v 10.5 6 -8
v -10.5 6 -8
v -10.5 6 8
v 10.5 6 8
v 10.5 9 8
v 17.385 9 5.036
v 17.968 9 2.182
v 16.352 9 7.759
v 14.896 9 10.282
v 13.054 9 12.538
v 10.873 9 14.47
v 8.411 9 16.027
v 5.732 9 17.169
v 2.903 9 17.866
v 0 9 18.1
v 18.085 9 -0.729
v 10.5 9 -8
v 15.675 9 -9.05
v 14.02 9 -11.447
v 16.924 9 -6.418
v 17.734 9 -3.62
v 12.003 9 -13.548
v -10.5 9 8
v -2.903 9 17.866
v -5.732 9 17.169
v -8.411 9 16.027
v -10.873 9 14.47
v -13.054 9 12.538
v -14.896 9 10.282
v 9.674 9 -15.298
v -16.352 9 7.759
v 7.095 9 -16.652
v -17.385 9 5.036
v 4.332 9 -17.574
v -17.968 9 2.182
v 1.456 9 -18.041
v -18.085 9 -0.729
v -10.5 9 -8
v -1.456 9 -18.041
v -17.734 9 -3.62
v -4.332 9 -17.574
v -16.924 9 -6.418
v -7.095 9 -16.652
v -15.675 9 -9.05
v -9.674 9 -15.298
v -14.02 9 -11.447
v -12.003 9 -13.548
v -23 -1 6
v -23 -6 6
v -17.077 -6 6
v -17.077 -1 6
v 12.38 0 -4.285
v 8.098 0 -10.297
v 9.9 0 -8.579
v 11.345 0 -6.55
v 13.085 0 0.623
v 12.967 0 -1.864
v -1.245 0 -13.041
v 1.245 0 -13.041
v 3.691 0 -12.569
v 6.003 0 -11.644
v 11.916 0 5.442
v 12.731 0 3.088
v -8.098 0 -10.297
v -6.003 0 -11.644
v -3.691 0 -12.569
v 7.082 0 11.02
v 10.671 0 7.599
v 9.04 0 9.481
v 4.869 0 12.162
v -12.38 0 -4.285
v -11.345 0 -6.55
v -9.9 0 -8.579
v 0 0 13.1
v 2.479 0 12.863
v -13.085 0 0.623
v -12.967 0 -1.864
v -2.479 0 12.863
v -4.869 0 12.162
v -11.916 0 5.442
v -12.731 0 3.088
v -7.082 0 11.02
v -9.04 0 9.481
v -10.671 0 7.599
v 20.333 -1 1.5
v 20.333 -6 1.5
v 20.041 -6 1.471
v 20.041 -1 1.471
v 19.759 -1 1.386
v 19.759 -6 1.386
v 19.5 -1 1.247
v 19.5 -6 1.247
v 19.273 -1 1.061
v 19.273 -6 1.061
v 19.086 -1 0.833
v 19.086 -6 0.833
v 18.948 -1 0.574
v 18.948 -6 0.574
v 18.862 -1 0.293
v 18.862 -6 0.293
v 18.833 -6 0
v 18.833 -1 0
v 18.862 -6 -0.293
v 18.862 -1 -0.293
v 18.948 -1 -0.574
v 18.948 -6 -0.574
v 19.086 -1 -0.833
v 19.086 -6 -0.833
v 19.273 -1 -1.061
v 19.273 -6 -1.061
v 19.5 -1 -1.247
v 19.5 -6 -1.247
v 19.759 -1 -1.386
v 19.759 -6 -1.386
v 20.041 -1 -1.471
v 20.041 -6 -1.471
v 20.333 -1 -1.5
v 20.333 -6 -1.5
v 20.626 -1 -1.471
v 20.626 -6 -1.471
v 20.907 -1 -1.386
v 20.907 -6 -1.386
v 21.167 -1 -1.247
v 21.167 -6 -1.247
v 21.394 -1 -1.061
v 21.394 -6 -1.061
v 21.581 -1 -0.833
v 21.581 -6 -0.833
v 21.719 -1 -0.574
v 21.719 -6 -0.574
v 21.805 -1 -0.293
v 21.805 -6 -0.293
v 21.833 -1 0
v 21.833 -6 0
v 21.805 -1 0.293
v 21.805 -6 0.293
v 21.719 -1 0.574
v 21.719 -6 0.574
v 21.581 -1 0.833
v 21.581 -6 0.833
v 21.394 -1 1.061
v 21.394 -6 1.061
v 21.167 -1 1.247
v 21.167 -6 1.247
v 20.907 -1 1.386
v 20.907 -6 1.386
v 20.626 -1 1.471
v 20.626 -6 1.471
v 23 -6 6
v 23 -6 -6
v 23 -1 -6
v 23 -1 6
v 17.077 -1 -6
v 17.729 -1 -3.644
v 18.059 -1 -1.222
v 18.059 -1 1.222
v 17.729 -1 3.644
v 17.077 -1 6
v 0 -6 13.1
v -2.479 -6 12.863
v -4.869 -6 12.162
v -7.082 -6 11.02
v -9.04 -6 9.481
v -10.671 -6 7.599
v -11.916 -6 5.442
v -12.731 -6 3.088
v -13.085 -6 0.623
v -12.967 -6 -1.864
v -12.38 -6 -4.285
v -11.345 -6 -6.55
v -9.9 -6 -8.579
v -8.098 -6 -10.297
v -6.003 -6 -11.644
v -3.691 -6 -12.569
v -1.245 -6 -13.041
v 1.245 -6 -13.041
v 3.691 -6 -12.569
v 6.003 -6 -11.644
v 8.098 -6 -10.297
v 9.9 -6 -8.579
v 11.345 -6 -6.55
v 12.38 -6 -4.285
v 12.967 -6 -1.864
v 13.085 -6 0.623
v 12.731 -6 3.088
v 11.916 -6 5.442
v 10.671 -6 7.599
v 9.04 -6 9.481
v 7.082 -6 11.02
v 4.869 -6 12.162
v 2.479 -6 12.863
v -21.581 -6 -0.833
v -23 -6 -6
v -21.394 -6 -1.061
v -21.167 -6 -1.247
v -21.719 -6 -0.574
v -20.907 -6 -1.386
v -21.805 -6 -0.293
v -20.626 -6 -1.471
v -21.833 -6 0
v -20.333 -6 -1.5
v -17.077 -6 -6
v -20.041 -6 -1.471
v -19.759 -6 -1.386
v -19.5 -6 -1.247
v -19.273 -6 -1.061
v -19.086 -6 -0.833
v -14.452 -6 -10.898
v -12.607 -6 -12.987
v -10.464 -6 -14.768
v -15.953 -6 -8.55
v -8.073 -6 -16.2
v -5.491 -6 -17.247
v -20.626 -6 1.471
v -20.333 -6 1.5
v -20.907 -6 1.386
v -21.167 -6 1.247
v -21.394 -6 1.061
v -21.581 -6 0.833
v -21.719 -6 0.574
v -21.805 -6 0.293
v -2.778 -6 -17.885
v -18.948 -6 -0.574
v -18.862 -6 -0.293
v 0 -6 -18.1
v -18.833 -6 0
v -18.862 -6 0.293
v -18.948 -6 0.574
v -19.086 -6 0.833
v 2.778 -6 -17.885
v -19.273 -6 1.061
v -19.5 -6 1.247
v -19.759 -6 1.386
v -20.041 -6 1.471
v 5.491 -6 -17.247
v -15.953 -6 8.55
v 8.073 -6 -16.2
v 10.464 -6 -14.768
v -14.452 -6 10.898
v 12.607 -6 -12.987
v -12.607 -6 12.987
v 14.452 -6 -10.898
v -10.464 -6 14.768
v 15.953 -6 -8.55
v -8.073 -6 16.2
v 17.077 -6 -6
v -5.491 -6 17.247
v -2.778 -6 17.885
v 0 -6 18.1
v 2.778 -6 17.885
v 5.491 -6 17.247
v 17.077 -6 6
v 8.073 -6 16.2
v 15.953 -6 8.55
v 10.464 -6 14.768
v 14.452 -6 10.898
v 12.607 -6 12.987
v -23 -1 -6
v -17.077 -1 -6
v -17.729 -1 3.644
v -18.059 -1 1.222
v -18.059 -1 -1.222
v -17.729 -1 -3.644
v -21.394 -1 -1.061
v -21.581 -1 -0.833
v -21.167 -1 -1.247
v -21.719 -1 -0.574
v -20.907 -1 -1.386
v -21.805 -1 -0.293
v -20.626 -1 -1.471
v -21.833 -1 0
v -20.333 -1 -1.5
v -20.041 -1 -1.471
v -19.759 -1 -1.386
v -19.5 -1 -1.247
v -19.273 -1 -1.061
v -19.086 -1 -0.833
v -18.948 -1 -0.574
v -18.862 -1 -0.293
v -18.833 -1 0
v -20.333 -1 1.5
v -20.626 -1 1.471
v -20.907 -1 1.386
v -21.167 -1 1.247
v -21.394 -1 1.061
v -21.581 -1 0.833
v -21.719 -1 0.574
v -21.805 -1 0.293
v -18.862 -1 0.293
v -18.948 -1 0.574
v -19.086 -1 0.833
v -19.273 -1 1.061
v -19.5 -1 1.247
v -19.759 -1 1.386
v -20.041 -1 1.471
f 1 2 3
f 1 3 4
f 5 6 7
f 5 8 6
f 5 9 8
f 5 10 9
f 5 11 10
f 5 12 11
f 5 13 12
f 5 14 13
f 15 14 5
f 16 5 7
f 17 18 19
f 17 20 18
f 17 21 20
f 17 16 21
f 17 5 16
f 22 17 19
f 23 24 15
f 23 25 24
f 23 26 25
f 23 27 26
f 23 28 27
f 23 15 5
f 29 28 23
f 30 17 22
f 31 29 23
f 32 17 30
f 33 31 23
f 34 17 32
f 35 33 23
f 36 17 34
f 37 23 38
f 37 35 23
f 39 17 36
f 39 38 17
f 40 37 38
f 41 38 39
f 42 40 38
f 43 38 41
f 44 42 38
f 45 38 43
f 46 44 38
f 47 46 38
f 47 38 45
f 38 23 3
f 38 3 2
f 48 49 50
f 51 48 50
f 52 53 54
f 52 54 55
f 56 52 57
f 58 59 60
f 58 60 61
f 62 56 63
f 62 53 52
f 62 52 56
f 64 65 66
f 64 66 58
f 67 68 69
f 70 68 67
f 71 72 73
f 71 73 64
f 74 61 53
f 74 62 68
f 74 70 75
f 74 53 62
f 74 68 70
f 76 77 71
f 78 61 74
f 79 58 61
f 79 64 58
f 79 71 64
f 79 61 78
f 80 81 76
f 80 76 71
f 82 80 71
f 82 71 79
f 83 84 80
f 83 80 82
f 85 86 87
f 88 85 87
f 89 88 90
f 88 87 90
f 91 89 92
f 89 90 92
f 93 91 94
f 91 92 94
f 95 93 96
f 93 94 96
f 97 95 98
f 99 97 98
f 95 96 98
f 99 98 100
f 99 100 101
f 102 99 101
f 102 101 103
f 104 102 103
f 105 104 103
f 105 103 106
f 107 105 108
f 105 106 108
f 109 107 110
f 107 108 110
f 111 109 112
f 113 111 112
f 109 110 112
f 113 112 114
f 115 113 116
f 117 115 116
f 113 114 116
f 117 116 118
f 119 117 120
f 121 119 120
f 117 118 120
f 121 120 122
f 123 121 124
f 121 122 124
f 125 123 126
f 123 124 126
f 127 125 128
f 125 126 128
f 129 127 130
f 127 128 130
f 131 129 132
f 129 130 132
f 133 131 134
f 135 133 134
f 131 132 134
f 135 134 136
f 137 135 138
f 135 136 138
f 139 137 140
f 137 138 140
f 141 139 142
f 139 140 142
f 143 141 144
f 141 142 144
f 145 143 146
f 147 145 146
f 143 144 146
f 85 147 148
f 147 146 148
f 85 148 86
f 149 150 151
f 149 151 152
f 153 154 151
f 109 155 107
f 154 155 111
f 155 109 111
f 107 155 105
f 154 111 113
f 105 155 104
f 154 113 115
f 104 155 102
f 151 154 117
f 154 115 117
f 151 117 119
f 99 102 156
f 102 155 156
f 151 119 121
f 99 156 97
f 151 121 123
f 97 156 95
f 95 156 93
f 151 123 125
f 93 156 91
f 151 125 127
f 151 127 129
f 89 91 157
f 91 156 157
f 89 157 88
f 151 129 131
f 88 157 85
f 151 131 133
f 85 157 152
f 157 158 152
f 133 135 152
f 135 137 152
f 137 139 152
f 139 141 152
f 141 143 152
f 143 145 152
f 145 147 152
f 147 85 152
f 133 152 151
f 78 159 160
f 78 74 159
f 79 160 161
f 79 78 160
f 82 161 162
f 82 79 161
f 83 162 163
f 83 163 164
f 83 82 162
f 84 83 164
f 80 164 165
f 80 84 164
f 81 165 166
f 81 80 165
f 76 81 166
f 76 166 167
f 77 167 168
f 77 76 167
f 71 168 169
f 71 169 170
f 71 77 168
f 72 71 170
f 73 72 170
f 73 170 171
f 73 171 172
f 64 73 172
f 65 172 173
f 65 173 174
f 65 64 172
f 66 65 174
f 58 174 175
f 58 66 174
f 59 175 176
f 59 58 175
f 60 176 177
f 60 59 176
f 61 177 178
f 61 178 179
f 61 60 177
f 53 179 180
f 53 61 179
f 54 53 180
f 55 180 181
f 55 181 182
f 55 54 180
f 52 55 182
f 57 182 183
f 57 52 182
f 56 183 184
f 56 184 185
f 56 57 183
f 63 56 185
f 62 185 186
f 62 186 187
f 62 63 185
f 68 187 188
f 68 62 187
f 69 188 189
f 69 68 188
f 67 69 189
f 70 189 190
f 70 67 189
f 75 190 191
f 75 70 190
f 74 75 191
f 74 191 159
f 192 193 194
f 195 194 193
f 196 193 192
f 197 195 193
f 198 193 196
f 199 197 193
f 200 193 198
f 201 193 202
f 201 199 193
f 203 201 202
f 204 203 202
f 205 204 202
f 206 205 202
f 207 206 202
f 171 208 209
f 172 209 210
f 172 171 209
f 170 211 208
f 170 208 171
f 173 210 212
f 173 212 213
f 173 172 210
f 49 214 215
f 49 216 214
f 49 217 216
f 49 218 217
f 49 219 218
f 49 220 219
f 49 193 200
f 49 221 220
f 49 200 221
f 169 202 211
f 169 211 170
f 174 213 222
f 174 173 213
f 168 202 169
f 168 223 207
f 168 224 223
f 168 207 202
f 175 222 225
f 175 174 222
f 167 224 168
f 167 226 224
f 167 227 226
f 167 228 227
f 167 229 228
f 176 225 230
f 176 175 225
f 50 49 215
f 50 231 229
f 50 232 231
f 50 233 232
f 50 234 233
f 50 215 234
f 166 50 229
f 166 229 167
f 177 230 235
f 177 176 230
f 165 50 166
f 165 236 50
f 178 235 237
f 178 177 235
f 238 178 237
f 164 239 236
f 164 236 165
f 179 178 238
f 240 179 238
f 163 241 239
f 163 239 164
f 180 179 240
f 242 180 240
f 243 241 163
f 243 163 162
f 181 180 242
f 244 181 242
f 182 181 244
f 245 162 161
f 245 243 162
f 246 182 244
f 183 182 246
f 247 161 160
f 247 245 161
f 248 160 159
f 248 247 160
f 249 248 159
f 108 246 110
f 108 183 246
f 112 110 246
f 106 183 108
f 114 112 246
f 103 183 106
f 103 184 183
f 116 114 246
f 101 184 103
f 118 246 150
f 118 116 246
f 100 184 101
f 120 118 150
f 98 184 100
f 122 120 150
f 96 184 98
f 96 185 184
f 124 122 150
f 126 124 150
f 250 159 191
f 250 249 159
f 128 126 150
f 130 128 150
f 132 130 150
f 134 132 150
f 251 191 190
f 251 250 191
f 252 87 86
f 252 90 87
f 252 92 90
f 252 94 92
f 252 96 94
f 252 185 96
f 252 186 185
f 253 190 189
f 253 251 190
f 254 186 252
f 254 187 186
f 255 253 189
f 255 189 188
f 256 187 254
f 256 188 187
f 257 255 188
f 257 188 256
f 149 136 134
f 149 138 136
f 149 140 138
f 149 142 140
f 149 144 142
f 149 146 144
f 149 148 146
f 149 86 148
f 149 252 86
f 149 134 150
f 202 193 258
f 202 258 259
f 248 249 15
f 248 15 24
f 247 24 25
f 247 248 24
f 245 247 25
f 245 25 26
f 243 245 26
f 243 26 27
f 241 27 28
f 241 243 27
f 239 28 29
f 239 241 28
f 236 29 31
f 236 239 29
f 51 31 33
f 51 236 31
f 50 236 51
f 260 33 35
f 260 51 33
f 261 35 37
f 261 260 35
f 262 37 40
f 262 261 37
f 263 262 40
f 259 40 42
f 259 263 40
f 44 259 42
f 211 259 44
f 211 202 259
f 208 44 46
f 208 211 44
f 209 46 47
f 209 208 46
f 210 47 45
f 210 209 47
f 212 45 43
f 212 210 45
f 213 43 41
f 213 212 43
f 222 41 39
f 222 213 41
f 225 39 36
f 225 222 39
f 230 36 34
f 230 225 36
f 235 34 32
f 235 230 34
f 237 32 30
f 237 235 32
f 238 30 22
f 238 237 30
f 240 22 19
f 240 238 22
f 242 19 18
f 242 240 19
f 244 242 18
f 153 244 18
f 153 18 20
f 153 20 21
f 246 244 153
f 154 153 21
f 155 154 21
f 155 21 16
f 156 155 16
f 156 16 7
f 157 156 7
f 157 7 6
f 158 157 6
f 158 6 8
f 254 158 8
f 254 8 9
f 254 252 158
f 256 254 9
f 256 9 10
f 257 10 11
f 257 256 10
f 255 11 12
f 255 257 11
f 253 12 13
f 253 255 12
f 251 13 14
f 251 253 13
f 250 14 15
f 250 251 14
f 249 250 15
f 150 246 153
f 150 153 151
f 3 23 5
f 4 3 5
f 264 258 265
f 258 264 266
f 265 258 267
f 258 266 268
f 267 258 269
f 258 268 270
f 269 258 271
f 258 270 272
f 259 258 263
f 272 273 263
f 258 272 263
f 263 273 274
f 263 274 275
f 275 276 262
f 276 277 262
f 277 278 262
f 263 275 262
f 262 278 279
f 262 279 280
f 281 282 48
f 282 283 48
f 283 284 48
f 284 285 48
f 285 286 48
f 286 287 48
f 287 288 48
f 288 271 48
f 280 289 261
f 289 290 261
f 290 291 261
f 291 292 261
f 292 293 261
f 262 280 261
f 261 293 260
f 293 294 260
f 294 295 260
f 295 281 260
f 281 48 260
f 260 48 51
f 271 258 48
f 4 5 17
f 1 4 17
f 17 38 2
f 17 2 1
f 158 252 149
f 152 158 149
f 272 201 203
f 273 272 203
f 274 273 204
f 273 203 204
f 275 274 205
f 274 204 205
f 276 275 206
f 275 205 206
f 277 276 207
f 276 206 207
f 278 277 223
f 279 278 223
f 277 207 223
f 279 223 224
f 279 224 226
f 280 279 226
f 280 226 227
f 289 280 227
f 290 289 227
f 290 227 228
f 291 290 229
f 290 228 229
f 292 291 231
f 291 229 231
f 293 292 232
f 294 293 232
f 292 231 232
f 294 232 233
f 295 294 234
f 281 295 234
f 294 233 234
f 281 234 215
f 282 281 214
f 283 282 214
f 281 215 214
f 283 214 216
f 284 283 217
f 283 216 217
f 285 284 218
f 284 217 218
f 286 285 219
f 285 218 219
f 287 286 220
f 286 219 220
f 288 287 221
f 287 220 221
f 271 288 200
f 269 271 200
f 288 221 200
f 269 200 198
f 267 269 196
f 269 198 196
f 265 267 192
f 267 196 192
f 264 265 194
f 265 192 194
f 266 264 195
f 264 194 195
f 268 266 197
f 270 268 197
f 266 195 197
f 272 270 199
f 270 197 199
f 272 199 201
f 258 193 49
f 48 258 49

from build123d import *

# Parameters (mm, degrees)
CROQUIS2_W              = 21
CROQUIS2_H              = 16
CORTAR_EXTRUIR1_DEPTH   = 3
CROQUIS4_W              = 8
CROQUIS4_H              = 12
CROQUIS4_R              = 1.5
SALIENTE_EXTRUIR1_DEPTH = 5


with BuildPart() as part:
    # Croquis1 → Revolución1 (revolve)
    with BuildSketch(Plane.XY, mode=Mode.PRIVATE) as revoluci_n1_sk:
        Polygon((-18.1, 9), (-18.1, -6), (-13.1, -6), (-13.1, 0), (0, 0), (0, 9), align=None)
    revolve(revoluci_n1_sk.sketch.rotate(Axis((0, 25.323006639, 0), (0, -1, 0)), 270), axis=Axis((0, 25.323006639, 0), (0, -1, 0)))

    # Croquis2 → Cortar-Extruir1 (cut)
    with BuildSketch(Plane(origin=(0, 9, 0), x_dir=(1, 0, 0), z_dir=(0, 1, 0))):
        Rectangle(CROQUIS2_W, CROQUIS2_H)
    extrude(amount=-CORTAR_EXTRUIR1_DEPTH, mode=Mode.SUBTRACT)

    # Croquis4 → Saliente-Extruir1 (add)
    # profile 1 of 2: a face of its own
    with BuildSketch(Plane.XZ.offset(6)):
        with Locations((-19, 0)):
            Rectangle(CROQUIS4_W, CROQUIS4_H)
        with Locations(Location((-20.333333333, 0, 0), (0, 0, 270))):
            Circle(CROQUIS4_R, mode=Mode.SUBTRACT)
    # profile 2 of 2: a face of its own
    with BuildSketch(Plane.XZ.offset(6)):
        with Locations((19, 0)):
            Rectangle(CROQUIS4_W, CROQUIS4_H)
        with Locations(Location((20.333333333, 0, 0), (0, 0, 90))):
            Circle(CROQUIS4_R, mode=Mode.SUBTRACT)
    extrude(amount=-SALIENTE_EXTRUIR1_DEPTH)


solid = part.part
